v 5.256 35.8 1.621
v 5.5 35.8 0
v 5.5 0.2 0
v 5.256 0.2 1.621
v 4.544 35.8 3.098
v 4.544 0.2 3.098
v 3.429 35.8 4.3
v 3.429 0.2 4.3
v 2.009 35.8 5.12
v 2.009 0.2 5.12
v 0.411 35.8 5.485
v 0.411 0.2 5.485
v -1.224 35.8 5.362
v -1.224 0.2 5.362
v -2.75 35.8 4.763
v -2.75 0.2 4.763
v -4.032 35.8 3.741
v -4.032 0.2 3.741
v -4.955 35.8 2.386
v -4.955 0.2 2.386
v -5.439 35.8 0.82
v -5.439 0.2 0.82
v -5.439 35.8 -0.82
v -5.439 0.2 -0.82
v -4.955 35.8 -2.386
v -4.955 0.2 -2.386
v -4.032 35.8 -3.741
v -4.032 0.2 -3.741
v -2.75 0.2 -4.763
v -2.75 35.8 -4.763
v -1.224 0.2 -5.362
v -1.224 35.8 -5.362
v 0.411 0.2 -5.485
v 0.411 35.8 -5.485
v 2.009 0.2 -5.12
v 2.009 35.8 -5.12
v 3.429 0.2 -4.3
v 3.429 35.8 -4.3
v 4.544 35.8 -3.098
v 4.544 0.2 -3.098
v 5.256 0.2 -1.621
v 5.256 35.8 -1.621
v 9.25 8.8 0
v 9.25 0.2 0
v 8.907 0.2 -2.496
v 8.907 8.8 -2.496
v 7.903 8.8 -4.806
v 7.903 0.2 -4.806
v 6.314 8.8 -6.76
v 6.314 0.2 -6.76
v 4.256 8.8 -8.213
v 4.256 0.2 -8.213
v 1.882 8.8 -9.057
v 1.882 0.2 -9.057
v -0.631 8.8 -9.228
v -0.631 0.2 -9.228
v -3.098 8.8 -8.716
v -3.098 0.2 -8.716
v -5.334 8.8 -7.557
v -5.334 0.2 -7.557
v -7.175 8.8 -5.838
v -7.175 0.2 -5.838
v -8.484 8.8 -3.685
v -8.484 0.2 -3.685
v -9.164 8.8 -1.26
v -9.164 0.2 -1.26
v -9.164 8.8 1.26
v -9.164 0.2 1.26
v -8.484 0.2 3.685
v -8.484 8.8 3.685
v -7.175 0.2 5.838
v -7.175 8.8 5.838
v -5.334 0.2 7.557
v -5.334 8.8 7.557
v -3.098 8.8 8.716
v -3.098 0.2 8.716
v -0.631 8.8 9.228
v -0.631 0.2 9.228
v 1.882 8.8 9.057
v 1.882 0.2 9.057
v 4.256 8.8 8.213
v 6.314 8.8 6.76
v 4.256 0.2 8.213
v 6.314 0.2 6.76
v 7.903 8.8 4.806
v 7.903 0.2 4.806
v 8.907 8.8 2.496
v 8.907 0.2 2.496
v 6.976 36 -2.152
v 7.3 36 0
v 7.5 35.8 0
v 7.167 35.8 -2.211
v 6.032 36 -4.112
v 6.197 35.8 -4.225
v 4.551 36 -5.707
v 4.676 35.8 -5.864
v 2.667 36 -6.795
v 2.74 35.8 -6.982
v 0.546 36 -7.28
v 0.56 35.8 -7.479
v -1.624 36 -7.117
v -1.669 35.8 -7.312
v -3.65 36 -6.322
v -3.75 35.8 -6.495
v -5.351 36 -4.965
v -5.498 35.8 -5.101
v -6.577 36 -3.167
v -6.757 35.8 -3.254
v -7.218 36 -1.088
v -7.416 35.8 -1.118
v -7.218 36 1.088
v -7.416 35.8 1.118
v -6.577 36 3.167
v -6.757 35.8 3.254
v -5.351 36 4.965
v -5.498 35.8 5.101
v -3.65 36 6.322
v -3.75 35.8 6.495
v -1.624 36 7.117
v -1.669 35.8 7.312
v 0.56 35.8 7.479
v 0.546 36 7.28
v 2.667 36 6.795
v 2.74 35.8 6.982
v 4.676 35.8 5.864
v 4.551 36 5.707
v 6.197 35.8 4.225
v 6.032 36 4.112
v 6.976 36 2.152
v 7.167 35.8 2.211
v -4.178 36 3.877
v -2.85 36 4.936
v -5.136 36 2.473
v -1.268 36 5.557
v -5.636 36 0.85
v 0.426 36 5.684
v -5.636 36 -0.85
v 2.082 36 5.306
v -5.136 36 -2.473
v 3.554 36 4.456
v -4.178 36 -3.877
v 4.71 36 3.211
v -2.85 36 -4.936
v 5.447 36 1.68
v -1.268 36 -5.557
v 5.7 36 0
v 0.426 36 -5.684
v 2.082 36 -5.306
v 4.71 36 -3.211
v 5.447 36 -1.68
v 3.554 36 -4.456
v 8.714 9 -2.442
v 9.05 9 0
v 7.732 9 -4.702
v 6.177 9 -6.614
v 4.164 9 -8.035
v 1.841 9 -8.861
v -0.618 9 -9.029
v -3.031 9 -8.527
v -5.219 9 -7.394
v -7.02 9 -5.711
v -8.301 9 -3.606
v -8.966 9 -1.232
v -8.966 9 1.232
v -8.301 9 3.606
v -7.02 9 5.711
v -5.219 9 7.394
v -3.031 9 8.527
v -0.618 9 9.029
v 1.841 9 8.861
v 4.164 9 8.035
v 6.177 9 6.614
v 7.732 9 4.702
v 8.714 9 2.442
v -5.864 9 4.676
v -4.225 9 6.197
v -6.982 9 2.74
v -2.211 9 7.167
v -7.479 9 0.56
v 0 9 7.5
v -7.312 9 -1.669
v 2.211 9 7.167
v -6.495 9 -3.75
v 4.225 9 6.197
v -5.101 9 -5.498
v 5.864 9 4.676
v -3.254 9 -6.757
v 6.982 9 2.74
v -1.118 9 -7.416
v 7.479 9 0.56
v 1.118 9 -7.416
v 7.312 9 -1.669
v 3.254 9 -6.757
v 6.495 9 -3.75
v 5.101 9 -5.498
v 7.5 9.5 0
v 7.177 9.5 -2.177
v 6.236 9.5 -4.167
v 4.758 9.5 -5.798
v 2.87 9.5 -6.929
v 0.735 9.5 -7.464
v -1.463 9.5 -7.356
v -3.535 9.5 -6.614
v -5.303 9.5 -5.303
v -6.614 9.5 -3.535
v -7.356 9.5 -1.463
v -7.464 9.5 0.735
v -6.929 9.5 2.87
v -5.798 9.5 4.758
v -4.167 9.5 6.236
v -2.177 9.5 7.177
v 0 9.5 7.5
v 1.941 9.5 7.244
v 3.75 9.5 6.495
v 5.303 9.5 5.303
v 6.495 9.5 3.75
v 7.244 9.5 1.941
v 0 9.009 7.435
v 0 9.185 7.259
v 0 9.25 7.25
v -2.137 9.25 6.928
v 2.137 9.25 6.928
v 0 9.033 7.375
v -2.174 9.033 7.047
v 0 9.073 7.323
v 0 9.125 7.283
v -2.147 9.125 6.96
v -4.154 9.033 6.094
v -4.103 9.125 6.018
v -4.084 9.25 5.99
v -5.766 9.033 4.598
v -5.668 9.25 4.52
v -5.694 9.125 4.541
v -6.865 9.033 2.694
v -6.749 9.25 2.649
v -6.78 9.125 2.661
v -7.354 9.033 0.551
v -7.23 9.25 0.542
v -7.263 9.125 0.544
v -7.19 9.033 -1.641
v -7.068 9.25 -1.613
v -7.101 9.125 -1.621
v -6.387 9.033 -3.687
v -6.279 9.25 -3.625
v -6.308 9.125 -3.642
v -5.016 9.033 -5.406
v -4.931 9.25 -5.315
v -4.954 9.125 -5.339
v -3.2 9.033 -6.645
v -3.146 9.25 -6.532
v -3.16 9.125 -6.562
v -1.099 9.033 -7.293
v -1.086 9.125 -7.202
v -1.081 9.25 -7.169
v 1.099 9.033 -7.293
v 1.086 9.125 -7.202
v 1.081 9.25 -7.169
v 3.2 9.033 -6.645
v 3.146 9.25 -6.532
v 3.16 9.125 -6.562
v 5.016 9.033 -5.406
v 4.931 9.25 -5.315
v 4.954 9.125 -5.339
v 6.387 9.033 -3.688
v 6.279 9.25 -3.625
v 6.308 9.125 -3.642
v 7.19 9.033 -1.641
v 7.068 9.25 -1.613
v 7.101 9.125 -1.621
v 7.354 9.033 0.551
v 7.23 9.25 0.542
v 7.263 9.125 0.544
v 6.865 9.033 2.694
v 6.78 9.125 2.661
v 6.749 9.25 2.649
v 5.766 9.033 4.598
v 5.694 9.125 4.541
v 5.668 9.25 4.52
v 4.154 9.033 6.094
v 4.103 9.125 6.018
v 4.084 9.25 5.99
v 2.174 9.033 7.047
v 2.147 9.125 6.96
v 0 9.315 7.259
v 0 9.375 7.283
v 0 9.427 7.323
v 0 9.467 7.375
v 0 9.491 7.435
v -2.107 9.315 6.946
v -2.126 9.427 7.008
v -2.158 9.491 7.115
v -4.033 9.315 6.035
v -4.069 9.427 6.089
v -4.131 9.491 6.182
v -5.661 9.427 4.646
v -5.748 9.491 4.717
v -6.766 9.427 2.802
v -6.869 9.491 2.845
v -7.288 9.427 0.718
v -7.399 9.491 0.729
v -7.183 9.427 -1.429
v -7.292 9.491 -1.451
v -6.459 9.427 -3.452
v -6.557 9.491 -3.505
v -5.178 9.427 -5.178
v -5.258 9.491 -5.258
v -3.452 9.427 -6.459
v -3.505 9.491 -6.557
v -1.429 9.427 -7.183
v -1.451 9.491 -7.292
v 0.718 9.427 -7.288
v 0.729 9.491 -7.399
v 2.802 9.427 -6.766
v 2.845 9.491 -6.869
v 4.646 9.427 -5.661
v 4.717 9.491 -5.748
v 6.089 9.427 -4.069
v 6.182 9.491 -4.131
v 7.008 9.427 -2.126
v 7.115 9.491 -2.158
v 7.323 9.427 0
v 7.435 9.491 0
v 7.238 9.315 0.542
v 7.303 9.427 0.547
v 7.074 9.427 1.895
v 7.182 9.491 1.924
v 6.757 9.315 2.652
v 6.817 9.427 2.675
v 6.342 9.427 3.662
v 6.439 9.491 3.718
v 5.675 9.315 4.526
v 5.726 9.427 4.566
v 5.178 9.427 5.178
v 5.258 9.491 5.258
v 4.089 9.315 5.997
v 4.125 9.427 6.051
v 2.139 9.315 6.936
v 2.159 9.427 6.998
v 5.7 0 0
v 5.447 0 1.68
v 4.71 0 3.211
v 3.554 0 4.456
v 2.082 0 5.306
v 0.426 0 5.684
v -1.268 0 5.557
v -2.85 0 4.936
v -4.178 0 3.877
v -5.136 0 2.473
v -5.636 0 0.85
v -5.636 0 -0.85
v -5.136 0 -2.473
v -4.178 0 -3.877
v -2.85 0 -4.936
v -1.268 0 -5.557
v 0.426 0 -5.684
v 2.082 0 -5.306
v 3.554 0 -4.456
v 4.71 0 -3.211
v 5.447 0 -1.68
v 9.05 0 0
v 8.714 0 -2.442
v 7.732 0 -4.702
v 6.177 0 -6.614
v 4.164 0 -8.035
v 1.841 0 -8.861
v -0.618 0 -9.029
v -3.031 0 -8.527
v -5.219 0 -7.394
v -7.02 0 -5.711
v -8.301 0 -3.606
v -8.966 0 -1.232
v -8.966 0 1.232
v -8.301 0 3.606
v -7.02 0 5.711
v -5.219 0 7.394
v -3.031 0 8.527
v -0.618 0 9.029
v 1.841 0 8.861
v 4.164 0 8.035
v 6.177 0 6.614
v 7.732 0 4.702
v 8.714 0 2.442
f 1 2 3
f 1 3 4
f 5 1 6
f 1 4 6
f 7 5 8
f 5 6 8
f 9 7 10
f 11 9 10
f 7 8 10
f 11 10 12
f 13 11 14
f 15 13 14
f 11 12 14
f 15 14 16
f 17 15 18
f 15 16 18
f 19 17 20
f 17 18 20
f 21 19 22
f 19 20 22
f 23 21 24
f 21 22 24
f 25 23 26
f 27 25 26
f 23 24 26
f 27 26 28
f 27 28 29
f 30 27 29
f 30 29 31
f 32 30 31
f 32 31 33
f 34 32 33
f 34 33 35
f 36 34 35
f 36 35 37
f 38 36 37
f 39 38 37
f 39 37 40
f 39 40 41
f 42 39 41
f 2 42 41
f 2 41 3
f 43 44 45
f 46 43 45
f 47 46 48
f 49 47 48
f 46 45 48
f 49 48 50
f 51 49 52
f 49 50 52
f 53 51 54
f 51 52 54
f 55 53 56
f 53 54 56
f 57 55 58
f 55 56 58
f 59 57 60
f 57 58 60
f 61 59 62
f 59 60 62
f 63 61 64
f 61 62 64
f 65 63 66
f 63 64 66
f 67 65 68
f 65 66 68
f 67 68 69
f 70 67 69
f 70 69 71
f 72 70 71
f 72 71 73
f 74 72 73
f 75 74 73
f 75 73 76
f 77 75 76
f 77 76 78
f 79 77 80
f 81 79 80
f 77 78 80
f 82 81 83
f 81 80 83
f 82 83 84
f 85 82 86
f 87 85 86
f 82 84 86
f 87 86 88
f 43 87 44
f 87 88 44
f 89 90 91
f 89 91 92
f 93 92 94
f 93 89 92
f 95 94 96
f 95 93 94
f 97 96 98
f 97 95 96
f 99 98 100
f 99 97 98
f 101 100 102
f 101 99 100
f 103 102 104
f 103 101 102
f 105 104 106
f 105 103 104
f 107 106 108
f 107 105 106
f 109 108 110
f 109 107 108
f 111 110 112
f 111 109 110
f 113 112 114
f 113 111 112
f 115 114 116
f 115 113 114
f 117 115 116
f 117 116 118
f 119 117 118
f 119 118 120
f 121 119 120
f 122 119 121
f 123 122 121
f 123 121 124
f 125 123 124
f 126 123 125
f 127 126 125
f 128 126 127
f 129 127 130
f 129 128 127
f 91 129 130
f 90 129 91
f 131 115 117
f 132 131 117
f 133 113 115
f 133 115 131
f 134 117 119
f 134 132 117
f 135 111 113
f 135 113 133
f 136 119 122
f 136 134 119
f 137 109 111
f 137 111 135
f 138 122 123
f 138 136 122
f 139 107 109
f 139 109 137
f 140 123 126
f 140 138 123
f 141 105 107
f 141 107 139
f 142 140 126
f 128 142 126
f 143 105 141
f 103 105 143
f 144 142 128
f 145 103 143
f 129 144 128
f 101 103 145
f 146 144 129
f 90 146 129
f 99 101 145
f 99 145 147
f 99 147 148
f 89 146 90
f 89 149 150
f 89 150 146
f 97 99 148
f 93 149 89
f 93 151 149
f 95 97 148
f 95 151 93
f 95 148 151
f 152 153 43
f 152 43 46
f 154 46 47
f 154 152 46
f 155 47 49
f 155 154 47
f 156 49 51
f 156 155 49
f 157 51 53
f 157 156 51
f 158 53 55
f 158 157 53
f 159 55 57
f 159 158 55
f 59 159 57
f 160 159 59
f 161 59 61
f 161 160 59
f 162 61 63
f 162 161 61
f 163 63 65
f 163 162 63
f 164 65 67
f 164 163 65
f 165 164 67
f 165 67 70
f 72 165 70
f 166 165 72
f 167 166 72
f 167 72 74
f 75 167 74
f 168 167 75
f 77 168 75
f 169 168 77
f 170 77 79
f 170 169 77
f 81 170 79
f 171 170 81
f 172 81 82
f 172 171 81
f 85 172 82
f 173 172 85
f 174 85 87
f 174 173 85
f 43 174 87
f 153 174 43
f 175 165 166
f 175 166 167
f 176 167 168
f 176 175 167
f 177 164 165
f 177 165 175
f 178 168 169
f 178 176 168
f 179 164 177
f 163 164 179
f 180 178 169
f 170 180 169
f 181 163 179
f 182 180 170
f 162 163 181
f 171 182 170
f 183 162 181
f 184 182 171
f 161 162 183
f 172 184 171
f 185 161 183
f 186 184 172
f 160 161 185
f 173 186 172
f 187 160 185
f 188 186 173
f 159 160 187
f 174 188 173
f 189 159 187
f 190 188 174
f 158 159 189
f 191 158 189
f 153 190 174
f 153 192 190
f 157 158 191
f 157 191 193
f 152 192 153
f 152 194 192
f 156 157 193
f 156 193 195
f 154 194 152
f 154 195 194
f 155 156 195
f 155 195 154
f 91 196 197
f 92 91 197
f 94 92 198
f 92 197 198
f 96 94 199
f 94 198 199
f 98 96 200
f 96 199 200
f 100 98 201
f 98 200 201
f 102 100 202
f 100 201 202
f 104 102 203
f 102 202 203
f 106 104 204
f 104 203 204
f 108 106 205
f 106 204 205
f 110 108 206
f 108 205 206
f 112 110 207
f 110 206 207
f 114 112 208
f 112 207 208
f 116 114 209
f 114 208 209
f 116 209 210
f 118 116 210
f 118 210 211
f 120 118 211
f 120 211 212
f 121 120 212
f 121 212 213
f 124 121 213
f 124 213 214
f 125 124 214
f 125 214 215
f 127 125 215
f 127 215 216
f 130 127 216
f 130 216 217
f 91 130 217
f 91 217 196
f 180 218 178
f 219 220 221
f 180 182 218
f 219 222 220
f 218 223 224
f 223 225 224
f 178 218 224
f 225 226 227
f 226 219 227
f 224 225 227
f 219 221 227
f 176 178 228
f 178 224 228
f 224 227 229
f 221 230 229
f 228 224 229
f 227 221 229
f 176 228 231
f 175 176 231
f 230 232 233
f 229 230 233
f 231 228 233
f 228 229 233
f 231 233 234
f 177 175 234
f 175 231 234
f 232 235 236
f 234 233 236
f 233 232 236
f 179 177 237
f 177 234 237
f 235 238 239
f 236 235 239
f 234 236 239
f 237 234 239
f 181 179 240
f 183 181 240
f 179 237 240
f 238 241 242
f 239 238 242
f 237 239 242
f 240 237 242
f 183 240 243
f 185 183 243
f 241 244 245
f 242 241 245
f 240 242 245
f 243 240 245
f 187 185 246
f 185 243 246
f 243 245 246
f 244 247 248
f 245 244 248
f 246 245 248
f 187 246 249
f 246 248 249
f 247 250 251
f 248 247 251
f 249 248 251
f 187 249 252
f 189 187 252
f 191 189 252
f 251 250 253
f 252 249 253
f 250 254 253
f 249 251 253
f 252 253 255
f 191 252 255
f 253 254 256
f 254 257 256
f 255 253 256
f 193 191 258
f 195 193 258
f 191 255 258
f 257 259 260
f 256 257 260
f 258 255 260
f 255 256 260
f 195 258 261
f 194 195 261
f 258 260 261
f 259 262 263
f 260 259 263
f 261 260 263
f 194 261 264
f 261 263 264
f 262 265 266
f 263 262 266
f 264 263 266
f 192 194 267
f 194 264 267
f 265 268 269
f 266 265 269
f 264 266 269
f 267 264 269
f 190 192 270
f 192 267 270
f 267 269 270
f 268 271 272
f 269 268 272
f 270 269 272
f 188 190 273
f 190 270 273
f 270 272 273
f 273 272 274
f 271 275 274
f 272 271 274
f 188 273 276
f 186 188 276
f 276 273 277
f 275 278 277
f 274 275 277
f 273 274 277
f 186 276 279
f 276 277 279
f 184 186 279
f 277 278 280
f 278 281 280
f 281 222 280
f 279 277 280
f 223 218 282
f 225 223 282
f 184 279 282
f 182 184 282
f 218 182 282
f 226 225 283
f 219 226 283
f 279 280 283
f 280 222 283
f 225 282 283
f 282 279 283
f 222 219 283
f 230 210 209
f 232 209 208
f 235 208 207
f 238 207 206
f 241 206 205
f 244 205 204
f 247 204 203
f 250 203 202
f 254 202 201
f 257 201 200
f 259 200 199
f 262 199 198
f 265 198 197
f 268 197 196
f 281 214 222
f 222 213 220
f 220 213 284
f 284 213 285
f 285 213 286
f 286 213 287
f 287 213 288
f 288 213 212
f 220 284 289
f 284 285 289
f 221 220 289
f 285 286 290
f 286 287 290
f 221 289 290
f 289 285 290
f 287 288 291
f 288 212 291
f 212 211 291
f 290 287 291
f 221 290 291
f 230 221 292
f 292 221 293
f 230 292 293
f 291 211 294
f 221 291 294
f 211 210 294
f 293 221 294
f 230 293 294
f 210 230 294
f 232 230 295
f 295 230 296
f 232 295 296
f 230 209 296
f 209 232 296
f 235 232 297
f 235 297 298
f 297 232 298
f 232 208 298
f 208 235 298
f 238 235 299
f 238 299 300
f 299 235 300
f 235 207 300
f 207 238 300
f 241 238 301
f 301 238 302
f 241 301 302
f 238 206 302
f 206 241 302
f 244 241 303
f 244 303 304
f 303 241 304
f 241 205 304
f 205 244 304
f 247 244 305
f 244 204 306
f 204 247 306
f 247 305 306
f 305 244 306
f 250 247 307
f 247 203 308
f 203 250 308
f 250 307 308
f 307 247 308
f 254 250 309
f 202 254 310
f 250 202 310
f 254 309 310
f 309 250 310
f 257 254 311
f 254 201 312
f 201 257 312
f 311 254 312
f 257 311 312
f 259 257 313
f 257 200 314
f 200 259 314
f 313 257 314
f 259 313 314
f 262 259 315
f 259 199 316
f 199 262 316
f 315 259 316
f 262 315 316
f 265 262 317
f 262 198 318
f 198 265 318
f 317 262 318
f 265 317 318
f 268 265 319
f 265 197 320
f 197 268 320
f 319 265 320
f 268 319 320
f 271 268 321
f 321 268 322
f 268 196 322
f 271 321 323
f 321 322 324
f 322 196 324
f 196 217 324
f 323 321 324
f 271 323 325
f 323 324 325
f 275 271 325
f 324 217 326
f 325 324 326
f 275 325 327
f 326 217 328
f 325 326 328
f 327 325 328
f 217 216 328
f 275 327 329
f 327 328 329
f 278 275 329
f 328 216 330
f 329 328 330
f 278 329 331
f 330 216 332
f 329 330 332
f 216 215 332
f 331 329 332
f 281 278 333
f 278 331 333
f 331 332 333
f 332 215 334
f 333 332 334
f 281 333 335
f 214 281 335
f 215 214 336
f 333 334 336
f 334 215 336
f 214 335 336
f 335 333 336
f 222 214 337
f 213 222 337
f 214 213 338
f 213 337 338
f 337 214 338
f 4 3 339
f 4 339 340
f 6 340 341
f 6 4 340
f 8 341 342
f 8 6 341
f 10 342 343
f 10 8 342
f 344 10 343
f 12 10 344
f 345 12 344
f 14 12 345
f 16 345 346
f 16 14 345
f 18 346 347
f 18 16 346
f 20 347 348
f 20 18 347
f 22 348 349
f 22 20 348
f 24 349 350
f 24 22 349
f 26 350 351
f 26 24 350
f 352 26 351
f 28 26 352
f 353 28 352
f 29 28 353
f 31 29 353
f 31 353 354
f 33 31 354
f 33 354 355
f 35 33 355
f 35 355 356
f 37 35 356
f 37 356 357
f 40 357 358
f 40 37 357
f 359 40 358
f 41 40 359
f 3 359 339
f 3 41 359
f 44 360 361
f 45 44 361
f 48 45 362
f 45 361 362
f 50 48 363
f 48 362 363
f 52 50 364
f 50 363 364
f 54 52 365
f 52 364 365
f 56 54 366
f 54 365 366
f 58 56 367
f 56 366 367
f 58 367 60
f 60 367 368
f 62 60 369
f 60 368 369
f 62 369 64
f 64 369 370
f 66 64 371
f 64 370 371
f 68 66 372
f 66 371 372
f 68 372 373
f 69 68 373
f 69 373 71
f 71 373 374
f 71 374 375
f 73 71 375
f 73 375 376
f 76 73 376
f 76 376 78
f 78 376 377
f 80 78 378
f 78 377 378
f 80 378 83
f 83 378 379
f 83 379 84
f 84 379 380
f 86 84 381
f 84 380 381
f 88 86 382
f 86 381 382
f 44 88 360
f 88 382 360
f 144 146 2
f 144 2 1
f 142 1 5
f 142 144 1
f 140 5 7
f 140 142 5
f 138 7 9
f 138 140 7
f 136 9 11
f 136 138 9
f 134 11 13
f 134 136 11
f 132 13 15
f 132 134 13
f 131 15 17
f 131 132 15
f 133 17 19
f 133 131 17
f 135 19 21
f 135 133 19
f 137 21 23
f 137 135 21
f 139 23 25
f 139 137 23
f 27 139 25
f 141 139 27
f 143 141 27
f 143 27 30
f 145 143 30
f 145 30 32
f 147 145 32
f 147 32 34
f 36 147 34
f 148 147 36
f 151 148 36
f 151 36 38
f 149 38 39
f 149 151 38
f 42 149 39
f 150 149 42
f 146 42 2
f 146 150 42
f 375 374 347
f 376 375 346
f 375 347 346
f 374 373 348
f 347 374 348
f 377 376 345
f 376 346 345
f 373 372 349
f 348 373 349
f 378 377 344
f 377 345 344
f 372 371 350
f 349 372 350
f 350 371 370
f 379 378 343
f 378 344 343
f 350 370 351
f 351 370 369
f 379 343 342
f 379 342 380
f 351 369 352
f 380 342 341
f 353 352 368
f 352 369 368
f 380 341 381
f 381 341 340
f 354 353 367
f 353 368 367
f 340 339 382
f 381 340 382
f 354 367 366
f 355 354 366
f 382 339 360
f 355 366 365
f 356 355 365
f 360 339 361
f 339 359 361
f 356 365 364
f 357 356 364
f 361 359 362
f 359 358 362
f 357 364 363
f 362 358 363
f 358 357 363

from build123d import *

# Parameters (mm, degrees)
SKIZZE1_R                       = 9.25
AUFSATZ_LINEAR_AUSTRAGEN1_DEPTH = 9
SKIZZE2_R                       = 7.5
AUFSATZ_LINEAR_AUSTRAGEN2_DEPTH = 27
SKIZZE3_R                       = 5.5
SCHNITT_LINEAR_AUSTRAGEN1_DEPTH = 40
FASE1_SIZE                      = 0.2
SKIZZE4_R                       = 0.25


with BuildPart() as part:
    # Skizze1 → Aufsatz-Linear austragen1 (new body)
    with BuildSketch(Plane(origin=(0, 0, 0), x_dir=(1, 0, 0), z_dir=(0, 1, 0))):
        Circle(SKIZZE1_R)
    extrude(amount=AUFSATZ_LINEAR_AUSTRAGEN1_DEPTH)

    # Skizze2 → Aufsatz-Linear austragen2 (add)
    with BuildSketch(Plane(origin=(0, 9, 0), x_dir=(1, 0, 0), z_dir=(0, 1, 0))):
        Circle(SKIZZE2_R)
    extrude(amount=AUFSATZ_LINEAR_AUSTRAGEN2_DEPTH)

    # Skizze3 → Schnitt-Linear austragen1 (cut)
    with BuildSketch(Plane.XZ):
        Circle(SKIZZE3_R)
    extrude(amount=-SCHNITT_LINEAR_AUSTRAGEN1_DEPTH, mode=Mode.SUBTRACT)

    # Fase1
    fase1_edges = [part.edges().sort_by_distance(p)[0] for p in [
        (-5.5, 36, 0),
        (-5.5, 0, 0),
        (-9.25, 0, 0),
        (-9.25, 9, 0),
        (-7.5, 36, 0),
    ]]
    chamfer(fase1_edges, length=FASE1_SIZE)

    # Skizze4 → Schnitt-Rotation1 (revolve, cut)
    with BuildSketch(Plane(origin=(0, 0, 0), x_dir=(0, 0, -1), z_dir=(1, 0, 0))):
        with Locations((-7.5, 9.25)):
            Circle(SKIZZE4_R)
    revolve(axis=Axis((0, 12.492787288, 0), (0, -1, 0)), mode=Mode.SUBTRACT)


solid = part.part
